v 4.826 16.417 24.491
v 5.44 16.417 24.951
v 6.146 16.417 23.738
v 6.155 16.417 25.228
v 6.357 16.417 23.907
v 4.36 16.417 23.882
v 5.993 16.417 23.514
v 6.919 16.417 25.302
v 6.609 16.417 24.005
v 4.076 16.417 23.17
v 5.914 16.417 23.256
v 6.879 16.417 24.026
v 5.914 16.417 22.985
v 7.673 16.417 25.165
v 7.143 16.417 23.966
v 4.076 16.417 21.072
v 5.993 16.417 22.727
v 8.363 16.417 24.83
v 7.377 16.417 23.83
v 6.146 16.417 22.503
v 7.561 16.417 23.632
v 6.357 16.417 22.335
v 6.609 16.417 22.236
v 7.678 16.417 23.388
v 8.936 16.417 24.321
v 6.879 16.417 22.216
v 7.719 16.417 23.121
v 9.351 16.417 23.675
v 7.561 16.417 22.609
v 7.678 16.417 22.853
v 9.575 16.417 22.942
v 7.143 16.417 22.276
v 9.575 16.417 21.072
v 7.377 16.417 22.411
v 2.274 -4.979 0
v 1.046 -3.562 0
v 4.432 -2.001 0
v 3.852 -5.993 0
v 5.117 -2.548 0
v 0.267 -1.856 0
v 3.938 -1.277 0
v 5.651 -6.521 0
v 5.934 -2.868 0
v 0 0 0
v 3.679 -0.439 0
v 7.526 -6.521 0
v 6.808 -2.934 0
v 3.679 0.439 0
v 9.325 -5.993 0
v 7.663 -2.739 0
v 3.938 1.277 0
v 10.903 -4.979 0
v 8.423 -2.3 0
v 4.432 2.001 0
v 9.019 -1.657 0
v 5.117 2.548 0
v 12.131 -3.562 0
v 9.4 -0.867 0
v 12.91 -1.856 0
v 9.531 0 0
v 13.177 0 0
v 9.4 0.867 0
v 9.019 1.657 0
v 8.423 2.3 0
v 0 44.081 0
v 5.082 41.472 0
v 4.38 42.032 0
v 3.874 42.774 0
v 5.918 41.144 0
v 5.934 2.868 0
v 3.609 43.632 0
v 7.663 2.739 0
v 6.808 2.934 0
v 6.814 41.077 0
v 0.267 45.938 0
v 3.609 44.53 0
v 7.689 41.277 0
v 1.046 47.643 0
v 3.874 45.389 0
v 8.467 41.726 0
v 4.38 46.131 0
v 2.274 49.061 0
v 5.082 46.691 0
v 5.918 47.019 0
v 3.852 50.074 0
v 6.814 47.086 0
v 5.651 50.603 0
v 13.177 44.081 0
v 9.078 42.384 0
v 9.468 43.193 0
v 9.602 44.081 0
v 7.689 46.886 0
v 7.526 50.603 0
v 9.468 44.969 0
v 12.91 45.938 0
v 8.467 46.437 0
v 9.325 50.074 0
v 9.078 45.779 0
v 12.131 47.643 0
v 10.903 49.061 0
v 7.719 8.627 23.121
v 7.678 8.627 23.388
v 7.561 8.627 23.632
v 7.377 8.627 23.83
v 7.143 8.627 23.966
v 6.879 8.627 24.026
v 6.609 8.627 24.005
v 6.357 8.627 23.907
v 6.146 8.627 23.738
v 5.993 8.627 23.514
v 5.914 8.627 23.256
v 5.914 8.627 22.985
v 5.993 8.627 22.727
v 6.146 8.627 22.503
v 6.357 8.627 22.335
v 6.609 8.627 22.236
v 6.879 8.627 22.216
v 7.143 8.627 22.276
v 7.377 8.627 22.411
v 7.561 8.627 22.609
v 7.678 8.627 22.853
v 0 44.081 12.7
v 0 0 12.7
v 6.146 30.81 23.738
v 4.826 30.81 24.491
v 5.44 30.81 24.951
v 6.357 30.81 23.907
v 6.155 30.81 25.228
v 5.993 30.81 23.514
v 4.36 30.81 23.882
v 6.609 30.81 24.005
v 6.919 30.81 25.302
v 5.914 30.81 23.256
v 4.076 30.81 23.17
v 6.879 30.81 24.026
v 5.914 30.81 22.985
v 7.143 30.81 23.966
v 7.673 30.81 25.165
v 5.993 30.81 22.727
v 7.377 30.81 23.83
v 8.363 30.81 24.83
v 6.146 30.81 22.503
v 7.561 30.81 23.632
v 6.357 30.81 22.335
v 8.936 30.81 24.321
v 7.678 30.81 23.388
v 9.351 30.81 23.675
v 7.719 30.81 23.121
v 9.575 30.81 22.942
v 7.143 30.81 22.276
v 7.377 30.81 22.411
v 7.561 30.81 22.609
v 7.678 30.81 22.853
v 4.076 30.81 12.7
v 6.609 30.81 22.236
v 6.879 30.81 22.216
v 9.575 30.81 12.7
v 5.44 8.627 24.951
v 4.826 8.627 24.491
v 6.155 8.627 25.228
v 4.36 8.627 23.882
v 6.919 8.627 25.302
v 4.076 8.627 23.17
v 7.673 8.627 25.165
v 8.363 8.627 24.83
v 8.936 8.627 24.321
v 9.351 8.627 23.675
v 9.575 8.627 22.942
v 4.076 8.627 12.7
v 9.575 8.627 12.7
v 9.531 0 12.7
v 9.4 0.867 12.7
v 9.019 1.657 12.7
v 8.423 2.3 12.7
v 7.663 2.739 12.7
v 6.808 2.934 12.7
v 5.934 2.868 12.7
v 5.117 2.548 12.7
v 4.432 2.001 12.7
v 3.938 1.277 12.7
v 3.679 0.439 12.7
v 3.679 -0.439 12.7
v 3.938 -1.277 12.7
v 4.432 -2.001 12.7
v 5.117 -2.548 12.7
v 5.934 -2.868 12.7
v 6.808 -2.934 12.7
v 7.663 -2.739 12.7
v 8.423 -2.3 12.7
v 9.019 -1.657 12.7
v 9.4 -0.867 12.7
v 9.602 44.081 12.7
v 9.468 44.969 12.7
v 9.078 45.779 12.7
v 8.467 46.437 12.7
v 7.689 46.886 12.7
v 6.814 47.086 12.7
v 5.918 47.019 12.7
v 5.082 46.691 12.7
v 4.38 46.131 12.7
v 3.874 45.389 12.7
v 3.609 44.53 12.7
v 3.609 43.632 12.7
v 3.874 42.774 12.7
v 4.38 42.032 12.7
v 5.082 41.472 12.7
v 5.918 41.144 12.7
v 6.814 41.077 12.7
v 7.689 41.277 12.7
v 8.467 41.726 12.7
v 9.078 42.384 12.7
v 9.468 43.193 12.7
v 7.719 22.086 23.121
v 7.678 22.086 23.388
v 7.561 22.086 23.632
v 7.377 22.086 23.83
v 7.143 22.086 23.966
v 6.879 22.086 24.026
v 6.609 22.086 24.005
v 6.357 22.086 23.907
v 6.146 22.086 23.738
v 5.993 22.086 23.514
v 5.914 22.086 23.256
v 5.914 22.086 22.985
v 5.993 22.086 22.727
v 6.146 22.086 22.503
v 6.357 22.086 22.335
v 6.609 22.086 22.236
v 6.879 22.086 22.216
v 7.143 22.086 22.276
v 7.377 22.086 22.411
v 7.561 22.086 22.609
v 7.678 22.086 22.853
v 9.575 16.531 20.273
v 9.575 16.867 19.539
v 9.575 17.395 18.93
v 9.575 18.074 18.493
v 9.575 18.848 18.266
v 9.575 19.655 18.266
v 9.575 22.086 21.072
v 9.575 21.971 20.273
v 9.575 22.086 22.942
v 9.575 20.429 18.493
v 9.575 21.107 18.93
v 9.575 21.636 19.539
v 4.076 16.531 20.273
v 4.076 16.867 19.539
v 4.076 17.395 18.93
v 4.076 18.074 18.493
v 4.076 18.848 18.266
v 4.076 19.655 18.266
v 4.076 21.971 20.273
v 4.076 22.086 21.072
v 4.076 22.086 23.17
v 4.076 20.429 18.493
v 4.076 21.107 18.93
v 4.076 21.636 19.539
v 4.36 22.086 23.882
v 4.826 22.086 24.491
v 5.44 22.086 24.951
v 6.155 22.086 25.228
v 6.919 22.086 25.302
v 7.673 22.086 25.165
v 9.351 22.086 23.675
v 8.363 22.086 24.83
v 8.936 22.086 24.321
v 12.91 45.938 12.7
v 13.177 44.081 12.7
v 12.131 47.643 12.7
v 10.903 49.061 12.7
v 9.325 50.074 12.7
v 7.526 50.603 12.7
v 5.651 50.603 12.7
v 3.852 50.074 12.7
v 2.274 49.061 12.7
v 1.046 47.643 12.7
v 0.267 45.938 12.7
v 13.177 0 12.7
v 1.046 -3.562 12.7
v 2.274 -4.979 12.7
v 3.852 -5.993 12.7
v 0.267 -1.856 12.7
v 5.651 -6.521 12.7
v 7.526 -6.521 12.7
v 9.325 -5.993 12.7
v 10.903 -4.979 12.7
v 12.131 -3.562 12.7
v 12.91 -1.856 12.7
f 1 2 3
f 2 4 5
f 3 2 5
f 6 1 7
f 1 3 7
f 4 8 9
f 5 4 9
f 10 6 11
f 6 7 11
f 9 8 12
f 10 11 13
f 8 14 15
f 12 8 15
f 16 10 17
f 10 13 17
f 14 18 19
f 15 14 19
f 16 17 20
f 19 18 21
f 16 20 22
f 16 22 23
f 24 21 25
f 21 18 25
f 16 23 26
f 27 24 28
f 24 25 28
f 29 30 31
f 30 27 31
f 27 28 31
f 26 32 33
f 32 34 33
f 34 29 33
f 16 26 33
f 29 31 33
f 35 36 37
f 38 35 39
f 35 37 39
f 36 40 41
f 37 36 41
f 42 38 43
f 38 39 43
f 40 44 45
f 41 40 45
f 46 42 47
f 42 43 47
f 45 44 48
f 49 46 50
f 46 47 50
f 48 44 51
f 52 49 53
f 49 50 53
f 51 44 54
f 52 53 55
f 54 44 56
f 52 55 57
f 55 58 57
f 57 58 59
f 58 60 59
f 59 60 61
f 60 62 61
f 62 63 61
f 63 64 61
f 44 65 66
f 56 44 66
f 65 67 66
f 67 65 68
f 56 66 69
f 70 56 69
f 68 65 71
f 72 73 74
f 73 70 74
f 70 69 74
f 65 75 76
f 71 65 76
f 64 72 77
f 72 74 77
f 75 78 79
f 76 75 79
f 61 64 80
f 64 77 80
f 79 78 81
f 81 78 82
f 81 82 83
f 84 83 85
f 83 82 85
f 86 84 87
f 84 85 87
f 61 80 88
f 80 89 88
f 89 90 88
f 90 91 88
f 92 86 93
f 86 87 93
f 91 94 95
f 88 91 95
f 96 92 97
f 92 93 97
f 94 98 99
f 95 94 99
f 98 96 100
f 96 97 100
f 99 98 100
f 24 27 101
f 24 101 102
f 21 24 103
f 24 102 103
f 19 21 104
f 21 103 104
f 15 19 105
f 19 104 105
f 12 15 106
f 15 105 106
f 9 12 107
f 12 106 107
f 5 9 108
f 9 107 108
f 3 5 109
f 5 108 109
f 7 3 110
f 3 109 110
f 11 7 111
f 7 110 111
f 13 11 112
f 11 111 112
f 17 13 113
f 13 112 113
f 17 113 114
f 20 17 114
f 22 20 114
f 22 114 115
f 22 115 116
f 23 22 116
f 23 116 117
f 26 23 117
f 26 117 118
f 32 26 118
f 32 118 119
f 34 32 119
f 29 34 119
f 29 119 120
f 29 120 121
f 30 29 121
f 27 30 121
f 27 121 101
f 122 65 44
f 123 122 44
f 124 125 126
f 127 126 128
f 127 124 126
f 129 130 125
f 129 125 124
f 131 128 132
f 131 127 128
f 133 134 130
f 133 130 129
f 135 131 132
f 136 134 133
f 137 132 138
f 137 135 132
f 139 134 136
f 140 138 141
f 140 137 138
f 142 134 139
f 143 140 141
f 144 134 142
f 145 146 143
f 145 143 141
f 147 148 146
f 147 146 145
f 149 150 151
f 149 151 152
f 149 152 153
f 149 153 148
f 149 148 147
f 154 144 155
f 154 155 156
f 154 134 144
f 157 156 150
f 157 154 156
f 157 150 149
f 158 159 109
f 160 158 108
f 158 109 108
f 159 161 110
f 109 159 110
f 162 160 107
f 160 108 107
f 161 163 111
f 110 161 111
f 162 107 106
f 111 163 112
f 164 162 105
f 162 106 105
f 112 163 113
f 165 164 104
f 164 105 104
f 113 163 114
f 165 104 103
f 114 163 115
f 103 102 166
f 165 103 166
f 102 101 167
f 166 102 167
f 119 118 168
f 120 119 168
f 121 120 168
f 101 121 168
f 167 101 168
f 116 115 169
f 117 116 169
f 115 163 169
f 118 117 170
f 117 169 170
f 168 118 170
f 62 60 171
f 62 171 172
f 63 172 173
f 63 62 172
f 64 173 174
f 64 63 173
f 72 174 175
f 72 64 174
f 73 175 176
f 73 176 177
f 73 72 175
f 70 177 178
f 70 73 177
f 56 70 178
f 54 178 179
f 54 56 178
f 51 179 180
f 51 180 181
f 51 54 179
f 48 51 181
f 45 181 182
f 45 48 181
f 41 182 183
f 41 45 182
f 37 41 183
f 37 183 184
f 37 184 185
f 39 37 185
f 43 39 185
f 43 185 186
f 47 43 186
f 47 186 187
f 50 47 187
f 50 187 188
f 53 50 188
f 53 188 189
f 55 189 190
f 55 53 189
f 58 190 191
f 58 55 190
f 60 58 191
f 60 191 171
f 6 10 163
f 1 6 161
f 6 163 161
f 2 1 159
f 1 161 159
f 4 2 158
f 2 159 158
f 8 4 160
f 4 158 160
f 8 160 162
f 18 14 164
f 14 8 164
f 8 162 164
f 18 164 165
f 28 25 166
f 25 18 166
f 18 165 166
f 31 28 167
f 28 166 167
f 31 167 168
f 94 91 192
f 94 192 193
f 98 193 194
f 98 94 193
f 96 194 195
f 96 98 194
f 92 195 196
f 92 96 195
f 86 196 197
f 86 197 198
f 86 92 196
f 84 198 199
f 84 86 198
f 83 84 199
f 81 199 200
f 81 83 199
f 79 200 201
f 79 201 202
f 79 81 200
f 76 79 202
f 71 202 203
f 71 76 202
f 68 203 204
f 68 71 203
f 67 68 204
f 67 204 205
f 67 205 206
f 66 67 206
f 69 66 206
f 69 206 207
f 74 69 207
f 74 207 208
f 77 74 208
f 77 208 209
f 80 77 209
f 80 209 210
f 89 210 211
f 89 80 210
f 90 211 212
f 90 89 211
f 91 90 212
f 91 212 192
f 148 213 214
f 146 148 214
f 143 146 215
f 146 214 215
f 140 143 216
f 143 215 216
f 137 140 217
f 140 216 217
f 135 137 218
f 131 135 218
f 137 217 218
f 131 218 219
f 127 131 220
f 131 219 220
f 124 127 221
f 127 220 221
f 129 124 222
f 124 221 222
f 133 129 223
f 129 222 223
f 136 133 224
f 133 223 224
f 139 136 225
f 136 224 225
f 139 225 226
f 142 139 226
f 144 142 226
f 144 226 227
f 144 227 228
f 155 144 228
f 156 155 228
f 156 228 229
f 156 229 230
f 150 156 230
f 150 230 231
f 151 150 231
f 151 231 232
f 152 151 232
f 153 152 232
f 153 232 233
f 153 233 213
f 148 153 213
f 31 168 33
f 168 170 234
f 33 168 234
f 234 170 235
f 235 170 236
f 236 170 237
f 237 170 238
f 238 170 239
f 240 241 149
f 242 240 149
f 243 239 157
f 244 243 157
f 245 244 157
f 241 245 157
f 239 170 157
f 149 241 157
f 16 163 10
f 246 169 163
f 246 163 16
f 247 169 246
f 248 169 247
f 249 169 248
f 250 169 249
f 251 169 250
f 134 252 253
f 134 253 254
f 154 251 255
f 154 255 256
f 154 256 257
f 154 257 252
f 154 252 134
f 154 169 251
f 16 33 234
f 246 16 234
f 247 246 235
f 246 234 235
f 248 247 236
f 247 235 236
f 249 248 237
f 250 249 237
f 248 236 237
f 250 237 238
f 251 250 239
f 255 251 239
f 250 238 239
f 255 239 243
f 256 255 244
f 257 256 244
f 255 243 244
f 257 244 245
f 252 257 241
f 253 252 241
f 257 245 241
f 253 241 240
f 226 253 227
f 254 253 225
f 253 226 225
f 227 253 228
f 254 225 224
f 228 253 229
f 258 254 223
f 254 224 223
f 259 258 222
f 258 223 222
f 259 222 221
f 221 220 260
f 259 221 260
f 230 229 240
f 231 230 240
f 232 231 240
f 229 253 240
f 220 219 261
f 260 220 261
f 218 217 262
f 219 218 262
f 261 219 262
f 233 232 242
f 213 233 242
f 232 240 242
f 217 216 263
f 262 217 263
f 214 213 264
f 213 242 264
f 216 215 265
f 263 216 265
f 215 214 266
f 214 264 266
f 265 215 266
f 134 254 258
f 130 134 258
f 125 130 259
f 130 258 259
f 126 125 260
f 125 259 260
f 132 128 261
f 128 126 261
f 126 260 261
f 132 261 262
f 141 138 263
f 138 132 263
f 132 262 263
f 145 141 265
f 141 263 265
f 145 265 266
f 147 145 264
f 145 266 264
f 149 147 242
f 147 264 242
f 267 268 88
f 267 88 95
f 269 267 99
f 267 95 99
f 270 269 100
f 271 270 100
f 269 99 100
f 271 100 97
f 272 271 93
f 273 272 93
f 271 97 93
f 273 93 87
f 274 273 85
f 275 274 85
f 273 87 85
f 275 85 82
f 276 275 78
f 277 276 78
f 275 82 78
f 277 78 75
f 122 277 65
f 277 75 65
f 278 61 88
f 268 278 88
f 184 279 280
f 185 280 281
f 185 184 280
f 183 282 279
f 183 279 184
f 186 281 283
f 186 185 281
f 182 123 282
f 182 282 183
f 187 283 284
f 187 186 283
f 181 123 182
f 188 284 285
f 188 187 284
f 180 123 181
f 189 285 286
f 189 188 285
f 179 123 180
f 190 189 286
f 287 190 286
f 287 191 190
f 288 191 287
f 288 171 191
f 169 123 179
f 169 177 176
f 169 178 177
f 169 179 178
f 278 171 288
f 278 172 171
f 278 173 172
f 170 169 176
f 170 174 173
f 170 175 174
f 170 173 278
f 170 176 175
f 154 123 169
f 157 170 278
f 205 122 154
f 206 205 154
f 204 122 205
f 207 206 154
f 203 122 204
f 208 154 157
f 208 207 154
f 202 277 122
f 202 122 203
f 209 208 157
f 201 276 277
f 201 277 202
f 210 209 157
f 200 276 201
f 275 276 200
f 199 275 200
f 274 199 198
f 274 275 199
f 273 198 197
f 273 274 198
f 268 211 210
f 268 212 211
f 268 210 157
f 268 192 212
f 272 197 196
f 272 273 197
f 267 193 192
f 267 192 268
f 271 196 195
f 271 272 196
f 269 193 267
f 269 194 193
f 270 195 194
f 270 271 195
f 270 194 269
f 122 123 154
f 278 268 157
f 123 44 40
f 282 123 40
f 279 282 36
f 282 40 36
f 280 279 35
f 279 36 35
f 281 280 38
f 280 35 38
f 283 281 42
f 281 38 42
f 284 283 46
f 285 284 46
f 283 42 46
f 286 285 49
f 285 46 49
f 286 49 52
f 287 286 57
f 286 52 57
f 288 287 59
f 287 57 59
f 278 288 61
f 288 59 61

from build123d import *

# Parameters (mm, degrees)
F0_R     = 2.9421946195
F0_R_2   = 3.0131155992
F1_DEPTH = 12.7
F2_W     = 5.4983180016
F2_H     = 22.1828678623
F3_DEPTH = 25.4
F5_DEPTH = 25.4
F7_DEPTH = 127
F8_R     = 0.907588381
F9_DEPTH = 127


with BuildPart() as f1:
    # F0 (on Top) → F1 (new body)
    with BuildSketch(Plane.XY):
        with BuildLine():
            Line((0, 44.08133775), (0, 0))
            ThreePointArc((0, 0), (6.5885009244, -6.5885009244), (13.1770018488, 0))
            Line((13.1770018488, 0), (13.1770018488, 44.08133775))
            ThreePointArc((13.1770018488, 44.08133775), (6.5885009244, 50.6698386744), (0, 44.08133775))
        make_face()
        with Locations((6.5885009244, 0)):
            Circle(F0_R, mode=Mode.SUBTRACT)
        with Locations((6.5885009244, 44.08133775)):
            Circle(F0_R_2, mode=Mode.SUBTRACT)
    extrude(amount=F1_DEPTH)

    # F2 (on Top) → F3 (join)
    with BuildSketch(Plane.XY):
        with Locations((6.8254983053, 19.7181045078)):
            Rectangle(F2_W, F2_H)
    extrude(amount=F3_DEPTH)

    # F4 (on face) → F5 (cut)
    with BuildSketch(Plane.YZ.offset(9.5746573061)):
        with BuildLine():
            Line((22.0856051892, 25.4), (16.4166372269, 25.4))
            Line((16.4166372269, 25.4), (16.4166372269, 21.0717450827))
            ThreePointArc((16.4166372269, 21.0717450827), (19.2511212081, 18.2372611016), (22.0856051892, 21.0717450827))
            Line((22.0856051892, 21.0717450827), (22.0856051892, 25.4))
        make_face()
    extrude(amount=-F5_DEPTH, mode=Mode.SUBTRACT)

    # F6 (on face) → F7 (cut)
    with BuildSketch(Plane.XZ.offset(-8.6266705766)):
        with BuildLine():
            ThreePointArc((4.0763393044, 23.1695235286), (6.9185308411, 25.3015410804), (9.5746573061, 22.9417648677))
            Line((9.5746573061, 22.9417648677), (9.5746573061, 25.4))
            Line((9.5746573061, 25.4), (8.0125611275, 25.4))
            Line((8.0125611275, 25.4), (5.4706284103, 25.4))
            Line((5.4706284103, 25.4), (4.0763393044, 25.4))
            Line((4.0763393044, 25.4), (4.0763393044, 23.5414523631))
            Line((4.0763393044, 23.5414523631), (4.0763393044, 23.1695235286))
        make_face()
    extrude(amount=-F7_DEPTH, mode=Mode.SUBTRACT)

    # F8 (on face) → F9 (cut)
    with BuildSketch(Plane.XZ.offset(-8.6266705766)):
        with Locations((6.8111866713, 23.1206584722)):
            Circle(F8_R)
    extrude(amount=-F9_DEPTH, mode=Mode.SUBTRACT)


solid = f1.part
